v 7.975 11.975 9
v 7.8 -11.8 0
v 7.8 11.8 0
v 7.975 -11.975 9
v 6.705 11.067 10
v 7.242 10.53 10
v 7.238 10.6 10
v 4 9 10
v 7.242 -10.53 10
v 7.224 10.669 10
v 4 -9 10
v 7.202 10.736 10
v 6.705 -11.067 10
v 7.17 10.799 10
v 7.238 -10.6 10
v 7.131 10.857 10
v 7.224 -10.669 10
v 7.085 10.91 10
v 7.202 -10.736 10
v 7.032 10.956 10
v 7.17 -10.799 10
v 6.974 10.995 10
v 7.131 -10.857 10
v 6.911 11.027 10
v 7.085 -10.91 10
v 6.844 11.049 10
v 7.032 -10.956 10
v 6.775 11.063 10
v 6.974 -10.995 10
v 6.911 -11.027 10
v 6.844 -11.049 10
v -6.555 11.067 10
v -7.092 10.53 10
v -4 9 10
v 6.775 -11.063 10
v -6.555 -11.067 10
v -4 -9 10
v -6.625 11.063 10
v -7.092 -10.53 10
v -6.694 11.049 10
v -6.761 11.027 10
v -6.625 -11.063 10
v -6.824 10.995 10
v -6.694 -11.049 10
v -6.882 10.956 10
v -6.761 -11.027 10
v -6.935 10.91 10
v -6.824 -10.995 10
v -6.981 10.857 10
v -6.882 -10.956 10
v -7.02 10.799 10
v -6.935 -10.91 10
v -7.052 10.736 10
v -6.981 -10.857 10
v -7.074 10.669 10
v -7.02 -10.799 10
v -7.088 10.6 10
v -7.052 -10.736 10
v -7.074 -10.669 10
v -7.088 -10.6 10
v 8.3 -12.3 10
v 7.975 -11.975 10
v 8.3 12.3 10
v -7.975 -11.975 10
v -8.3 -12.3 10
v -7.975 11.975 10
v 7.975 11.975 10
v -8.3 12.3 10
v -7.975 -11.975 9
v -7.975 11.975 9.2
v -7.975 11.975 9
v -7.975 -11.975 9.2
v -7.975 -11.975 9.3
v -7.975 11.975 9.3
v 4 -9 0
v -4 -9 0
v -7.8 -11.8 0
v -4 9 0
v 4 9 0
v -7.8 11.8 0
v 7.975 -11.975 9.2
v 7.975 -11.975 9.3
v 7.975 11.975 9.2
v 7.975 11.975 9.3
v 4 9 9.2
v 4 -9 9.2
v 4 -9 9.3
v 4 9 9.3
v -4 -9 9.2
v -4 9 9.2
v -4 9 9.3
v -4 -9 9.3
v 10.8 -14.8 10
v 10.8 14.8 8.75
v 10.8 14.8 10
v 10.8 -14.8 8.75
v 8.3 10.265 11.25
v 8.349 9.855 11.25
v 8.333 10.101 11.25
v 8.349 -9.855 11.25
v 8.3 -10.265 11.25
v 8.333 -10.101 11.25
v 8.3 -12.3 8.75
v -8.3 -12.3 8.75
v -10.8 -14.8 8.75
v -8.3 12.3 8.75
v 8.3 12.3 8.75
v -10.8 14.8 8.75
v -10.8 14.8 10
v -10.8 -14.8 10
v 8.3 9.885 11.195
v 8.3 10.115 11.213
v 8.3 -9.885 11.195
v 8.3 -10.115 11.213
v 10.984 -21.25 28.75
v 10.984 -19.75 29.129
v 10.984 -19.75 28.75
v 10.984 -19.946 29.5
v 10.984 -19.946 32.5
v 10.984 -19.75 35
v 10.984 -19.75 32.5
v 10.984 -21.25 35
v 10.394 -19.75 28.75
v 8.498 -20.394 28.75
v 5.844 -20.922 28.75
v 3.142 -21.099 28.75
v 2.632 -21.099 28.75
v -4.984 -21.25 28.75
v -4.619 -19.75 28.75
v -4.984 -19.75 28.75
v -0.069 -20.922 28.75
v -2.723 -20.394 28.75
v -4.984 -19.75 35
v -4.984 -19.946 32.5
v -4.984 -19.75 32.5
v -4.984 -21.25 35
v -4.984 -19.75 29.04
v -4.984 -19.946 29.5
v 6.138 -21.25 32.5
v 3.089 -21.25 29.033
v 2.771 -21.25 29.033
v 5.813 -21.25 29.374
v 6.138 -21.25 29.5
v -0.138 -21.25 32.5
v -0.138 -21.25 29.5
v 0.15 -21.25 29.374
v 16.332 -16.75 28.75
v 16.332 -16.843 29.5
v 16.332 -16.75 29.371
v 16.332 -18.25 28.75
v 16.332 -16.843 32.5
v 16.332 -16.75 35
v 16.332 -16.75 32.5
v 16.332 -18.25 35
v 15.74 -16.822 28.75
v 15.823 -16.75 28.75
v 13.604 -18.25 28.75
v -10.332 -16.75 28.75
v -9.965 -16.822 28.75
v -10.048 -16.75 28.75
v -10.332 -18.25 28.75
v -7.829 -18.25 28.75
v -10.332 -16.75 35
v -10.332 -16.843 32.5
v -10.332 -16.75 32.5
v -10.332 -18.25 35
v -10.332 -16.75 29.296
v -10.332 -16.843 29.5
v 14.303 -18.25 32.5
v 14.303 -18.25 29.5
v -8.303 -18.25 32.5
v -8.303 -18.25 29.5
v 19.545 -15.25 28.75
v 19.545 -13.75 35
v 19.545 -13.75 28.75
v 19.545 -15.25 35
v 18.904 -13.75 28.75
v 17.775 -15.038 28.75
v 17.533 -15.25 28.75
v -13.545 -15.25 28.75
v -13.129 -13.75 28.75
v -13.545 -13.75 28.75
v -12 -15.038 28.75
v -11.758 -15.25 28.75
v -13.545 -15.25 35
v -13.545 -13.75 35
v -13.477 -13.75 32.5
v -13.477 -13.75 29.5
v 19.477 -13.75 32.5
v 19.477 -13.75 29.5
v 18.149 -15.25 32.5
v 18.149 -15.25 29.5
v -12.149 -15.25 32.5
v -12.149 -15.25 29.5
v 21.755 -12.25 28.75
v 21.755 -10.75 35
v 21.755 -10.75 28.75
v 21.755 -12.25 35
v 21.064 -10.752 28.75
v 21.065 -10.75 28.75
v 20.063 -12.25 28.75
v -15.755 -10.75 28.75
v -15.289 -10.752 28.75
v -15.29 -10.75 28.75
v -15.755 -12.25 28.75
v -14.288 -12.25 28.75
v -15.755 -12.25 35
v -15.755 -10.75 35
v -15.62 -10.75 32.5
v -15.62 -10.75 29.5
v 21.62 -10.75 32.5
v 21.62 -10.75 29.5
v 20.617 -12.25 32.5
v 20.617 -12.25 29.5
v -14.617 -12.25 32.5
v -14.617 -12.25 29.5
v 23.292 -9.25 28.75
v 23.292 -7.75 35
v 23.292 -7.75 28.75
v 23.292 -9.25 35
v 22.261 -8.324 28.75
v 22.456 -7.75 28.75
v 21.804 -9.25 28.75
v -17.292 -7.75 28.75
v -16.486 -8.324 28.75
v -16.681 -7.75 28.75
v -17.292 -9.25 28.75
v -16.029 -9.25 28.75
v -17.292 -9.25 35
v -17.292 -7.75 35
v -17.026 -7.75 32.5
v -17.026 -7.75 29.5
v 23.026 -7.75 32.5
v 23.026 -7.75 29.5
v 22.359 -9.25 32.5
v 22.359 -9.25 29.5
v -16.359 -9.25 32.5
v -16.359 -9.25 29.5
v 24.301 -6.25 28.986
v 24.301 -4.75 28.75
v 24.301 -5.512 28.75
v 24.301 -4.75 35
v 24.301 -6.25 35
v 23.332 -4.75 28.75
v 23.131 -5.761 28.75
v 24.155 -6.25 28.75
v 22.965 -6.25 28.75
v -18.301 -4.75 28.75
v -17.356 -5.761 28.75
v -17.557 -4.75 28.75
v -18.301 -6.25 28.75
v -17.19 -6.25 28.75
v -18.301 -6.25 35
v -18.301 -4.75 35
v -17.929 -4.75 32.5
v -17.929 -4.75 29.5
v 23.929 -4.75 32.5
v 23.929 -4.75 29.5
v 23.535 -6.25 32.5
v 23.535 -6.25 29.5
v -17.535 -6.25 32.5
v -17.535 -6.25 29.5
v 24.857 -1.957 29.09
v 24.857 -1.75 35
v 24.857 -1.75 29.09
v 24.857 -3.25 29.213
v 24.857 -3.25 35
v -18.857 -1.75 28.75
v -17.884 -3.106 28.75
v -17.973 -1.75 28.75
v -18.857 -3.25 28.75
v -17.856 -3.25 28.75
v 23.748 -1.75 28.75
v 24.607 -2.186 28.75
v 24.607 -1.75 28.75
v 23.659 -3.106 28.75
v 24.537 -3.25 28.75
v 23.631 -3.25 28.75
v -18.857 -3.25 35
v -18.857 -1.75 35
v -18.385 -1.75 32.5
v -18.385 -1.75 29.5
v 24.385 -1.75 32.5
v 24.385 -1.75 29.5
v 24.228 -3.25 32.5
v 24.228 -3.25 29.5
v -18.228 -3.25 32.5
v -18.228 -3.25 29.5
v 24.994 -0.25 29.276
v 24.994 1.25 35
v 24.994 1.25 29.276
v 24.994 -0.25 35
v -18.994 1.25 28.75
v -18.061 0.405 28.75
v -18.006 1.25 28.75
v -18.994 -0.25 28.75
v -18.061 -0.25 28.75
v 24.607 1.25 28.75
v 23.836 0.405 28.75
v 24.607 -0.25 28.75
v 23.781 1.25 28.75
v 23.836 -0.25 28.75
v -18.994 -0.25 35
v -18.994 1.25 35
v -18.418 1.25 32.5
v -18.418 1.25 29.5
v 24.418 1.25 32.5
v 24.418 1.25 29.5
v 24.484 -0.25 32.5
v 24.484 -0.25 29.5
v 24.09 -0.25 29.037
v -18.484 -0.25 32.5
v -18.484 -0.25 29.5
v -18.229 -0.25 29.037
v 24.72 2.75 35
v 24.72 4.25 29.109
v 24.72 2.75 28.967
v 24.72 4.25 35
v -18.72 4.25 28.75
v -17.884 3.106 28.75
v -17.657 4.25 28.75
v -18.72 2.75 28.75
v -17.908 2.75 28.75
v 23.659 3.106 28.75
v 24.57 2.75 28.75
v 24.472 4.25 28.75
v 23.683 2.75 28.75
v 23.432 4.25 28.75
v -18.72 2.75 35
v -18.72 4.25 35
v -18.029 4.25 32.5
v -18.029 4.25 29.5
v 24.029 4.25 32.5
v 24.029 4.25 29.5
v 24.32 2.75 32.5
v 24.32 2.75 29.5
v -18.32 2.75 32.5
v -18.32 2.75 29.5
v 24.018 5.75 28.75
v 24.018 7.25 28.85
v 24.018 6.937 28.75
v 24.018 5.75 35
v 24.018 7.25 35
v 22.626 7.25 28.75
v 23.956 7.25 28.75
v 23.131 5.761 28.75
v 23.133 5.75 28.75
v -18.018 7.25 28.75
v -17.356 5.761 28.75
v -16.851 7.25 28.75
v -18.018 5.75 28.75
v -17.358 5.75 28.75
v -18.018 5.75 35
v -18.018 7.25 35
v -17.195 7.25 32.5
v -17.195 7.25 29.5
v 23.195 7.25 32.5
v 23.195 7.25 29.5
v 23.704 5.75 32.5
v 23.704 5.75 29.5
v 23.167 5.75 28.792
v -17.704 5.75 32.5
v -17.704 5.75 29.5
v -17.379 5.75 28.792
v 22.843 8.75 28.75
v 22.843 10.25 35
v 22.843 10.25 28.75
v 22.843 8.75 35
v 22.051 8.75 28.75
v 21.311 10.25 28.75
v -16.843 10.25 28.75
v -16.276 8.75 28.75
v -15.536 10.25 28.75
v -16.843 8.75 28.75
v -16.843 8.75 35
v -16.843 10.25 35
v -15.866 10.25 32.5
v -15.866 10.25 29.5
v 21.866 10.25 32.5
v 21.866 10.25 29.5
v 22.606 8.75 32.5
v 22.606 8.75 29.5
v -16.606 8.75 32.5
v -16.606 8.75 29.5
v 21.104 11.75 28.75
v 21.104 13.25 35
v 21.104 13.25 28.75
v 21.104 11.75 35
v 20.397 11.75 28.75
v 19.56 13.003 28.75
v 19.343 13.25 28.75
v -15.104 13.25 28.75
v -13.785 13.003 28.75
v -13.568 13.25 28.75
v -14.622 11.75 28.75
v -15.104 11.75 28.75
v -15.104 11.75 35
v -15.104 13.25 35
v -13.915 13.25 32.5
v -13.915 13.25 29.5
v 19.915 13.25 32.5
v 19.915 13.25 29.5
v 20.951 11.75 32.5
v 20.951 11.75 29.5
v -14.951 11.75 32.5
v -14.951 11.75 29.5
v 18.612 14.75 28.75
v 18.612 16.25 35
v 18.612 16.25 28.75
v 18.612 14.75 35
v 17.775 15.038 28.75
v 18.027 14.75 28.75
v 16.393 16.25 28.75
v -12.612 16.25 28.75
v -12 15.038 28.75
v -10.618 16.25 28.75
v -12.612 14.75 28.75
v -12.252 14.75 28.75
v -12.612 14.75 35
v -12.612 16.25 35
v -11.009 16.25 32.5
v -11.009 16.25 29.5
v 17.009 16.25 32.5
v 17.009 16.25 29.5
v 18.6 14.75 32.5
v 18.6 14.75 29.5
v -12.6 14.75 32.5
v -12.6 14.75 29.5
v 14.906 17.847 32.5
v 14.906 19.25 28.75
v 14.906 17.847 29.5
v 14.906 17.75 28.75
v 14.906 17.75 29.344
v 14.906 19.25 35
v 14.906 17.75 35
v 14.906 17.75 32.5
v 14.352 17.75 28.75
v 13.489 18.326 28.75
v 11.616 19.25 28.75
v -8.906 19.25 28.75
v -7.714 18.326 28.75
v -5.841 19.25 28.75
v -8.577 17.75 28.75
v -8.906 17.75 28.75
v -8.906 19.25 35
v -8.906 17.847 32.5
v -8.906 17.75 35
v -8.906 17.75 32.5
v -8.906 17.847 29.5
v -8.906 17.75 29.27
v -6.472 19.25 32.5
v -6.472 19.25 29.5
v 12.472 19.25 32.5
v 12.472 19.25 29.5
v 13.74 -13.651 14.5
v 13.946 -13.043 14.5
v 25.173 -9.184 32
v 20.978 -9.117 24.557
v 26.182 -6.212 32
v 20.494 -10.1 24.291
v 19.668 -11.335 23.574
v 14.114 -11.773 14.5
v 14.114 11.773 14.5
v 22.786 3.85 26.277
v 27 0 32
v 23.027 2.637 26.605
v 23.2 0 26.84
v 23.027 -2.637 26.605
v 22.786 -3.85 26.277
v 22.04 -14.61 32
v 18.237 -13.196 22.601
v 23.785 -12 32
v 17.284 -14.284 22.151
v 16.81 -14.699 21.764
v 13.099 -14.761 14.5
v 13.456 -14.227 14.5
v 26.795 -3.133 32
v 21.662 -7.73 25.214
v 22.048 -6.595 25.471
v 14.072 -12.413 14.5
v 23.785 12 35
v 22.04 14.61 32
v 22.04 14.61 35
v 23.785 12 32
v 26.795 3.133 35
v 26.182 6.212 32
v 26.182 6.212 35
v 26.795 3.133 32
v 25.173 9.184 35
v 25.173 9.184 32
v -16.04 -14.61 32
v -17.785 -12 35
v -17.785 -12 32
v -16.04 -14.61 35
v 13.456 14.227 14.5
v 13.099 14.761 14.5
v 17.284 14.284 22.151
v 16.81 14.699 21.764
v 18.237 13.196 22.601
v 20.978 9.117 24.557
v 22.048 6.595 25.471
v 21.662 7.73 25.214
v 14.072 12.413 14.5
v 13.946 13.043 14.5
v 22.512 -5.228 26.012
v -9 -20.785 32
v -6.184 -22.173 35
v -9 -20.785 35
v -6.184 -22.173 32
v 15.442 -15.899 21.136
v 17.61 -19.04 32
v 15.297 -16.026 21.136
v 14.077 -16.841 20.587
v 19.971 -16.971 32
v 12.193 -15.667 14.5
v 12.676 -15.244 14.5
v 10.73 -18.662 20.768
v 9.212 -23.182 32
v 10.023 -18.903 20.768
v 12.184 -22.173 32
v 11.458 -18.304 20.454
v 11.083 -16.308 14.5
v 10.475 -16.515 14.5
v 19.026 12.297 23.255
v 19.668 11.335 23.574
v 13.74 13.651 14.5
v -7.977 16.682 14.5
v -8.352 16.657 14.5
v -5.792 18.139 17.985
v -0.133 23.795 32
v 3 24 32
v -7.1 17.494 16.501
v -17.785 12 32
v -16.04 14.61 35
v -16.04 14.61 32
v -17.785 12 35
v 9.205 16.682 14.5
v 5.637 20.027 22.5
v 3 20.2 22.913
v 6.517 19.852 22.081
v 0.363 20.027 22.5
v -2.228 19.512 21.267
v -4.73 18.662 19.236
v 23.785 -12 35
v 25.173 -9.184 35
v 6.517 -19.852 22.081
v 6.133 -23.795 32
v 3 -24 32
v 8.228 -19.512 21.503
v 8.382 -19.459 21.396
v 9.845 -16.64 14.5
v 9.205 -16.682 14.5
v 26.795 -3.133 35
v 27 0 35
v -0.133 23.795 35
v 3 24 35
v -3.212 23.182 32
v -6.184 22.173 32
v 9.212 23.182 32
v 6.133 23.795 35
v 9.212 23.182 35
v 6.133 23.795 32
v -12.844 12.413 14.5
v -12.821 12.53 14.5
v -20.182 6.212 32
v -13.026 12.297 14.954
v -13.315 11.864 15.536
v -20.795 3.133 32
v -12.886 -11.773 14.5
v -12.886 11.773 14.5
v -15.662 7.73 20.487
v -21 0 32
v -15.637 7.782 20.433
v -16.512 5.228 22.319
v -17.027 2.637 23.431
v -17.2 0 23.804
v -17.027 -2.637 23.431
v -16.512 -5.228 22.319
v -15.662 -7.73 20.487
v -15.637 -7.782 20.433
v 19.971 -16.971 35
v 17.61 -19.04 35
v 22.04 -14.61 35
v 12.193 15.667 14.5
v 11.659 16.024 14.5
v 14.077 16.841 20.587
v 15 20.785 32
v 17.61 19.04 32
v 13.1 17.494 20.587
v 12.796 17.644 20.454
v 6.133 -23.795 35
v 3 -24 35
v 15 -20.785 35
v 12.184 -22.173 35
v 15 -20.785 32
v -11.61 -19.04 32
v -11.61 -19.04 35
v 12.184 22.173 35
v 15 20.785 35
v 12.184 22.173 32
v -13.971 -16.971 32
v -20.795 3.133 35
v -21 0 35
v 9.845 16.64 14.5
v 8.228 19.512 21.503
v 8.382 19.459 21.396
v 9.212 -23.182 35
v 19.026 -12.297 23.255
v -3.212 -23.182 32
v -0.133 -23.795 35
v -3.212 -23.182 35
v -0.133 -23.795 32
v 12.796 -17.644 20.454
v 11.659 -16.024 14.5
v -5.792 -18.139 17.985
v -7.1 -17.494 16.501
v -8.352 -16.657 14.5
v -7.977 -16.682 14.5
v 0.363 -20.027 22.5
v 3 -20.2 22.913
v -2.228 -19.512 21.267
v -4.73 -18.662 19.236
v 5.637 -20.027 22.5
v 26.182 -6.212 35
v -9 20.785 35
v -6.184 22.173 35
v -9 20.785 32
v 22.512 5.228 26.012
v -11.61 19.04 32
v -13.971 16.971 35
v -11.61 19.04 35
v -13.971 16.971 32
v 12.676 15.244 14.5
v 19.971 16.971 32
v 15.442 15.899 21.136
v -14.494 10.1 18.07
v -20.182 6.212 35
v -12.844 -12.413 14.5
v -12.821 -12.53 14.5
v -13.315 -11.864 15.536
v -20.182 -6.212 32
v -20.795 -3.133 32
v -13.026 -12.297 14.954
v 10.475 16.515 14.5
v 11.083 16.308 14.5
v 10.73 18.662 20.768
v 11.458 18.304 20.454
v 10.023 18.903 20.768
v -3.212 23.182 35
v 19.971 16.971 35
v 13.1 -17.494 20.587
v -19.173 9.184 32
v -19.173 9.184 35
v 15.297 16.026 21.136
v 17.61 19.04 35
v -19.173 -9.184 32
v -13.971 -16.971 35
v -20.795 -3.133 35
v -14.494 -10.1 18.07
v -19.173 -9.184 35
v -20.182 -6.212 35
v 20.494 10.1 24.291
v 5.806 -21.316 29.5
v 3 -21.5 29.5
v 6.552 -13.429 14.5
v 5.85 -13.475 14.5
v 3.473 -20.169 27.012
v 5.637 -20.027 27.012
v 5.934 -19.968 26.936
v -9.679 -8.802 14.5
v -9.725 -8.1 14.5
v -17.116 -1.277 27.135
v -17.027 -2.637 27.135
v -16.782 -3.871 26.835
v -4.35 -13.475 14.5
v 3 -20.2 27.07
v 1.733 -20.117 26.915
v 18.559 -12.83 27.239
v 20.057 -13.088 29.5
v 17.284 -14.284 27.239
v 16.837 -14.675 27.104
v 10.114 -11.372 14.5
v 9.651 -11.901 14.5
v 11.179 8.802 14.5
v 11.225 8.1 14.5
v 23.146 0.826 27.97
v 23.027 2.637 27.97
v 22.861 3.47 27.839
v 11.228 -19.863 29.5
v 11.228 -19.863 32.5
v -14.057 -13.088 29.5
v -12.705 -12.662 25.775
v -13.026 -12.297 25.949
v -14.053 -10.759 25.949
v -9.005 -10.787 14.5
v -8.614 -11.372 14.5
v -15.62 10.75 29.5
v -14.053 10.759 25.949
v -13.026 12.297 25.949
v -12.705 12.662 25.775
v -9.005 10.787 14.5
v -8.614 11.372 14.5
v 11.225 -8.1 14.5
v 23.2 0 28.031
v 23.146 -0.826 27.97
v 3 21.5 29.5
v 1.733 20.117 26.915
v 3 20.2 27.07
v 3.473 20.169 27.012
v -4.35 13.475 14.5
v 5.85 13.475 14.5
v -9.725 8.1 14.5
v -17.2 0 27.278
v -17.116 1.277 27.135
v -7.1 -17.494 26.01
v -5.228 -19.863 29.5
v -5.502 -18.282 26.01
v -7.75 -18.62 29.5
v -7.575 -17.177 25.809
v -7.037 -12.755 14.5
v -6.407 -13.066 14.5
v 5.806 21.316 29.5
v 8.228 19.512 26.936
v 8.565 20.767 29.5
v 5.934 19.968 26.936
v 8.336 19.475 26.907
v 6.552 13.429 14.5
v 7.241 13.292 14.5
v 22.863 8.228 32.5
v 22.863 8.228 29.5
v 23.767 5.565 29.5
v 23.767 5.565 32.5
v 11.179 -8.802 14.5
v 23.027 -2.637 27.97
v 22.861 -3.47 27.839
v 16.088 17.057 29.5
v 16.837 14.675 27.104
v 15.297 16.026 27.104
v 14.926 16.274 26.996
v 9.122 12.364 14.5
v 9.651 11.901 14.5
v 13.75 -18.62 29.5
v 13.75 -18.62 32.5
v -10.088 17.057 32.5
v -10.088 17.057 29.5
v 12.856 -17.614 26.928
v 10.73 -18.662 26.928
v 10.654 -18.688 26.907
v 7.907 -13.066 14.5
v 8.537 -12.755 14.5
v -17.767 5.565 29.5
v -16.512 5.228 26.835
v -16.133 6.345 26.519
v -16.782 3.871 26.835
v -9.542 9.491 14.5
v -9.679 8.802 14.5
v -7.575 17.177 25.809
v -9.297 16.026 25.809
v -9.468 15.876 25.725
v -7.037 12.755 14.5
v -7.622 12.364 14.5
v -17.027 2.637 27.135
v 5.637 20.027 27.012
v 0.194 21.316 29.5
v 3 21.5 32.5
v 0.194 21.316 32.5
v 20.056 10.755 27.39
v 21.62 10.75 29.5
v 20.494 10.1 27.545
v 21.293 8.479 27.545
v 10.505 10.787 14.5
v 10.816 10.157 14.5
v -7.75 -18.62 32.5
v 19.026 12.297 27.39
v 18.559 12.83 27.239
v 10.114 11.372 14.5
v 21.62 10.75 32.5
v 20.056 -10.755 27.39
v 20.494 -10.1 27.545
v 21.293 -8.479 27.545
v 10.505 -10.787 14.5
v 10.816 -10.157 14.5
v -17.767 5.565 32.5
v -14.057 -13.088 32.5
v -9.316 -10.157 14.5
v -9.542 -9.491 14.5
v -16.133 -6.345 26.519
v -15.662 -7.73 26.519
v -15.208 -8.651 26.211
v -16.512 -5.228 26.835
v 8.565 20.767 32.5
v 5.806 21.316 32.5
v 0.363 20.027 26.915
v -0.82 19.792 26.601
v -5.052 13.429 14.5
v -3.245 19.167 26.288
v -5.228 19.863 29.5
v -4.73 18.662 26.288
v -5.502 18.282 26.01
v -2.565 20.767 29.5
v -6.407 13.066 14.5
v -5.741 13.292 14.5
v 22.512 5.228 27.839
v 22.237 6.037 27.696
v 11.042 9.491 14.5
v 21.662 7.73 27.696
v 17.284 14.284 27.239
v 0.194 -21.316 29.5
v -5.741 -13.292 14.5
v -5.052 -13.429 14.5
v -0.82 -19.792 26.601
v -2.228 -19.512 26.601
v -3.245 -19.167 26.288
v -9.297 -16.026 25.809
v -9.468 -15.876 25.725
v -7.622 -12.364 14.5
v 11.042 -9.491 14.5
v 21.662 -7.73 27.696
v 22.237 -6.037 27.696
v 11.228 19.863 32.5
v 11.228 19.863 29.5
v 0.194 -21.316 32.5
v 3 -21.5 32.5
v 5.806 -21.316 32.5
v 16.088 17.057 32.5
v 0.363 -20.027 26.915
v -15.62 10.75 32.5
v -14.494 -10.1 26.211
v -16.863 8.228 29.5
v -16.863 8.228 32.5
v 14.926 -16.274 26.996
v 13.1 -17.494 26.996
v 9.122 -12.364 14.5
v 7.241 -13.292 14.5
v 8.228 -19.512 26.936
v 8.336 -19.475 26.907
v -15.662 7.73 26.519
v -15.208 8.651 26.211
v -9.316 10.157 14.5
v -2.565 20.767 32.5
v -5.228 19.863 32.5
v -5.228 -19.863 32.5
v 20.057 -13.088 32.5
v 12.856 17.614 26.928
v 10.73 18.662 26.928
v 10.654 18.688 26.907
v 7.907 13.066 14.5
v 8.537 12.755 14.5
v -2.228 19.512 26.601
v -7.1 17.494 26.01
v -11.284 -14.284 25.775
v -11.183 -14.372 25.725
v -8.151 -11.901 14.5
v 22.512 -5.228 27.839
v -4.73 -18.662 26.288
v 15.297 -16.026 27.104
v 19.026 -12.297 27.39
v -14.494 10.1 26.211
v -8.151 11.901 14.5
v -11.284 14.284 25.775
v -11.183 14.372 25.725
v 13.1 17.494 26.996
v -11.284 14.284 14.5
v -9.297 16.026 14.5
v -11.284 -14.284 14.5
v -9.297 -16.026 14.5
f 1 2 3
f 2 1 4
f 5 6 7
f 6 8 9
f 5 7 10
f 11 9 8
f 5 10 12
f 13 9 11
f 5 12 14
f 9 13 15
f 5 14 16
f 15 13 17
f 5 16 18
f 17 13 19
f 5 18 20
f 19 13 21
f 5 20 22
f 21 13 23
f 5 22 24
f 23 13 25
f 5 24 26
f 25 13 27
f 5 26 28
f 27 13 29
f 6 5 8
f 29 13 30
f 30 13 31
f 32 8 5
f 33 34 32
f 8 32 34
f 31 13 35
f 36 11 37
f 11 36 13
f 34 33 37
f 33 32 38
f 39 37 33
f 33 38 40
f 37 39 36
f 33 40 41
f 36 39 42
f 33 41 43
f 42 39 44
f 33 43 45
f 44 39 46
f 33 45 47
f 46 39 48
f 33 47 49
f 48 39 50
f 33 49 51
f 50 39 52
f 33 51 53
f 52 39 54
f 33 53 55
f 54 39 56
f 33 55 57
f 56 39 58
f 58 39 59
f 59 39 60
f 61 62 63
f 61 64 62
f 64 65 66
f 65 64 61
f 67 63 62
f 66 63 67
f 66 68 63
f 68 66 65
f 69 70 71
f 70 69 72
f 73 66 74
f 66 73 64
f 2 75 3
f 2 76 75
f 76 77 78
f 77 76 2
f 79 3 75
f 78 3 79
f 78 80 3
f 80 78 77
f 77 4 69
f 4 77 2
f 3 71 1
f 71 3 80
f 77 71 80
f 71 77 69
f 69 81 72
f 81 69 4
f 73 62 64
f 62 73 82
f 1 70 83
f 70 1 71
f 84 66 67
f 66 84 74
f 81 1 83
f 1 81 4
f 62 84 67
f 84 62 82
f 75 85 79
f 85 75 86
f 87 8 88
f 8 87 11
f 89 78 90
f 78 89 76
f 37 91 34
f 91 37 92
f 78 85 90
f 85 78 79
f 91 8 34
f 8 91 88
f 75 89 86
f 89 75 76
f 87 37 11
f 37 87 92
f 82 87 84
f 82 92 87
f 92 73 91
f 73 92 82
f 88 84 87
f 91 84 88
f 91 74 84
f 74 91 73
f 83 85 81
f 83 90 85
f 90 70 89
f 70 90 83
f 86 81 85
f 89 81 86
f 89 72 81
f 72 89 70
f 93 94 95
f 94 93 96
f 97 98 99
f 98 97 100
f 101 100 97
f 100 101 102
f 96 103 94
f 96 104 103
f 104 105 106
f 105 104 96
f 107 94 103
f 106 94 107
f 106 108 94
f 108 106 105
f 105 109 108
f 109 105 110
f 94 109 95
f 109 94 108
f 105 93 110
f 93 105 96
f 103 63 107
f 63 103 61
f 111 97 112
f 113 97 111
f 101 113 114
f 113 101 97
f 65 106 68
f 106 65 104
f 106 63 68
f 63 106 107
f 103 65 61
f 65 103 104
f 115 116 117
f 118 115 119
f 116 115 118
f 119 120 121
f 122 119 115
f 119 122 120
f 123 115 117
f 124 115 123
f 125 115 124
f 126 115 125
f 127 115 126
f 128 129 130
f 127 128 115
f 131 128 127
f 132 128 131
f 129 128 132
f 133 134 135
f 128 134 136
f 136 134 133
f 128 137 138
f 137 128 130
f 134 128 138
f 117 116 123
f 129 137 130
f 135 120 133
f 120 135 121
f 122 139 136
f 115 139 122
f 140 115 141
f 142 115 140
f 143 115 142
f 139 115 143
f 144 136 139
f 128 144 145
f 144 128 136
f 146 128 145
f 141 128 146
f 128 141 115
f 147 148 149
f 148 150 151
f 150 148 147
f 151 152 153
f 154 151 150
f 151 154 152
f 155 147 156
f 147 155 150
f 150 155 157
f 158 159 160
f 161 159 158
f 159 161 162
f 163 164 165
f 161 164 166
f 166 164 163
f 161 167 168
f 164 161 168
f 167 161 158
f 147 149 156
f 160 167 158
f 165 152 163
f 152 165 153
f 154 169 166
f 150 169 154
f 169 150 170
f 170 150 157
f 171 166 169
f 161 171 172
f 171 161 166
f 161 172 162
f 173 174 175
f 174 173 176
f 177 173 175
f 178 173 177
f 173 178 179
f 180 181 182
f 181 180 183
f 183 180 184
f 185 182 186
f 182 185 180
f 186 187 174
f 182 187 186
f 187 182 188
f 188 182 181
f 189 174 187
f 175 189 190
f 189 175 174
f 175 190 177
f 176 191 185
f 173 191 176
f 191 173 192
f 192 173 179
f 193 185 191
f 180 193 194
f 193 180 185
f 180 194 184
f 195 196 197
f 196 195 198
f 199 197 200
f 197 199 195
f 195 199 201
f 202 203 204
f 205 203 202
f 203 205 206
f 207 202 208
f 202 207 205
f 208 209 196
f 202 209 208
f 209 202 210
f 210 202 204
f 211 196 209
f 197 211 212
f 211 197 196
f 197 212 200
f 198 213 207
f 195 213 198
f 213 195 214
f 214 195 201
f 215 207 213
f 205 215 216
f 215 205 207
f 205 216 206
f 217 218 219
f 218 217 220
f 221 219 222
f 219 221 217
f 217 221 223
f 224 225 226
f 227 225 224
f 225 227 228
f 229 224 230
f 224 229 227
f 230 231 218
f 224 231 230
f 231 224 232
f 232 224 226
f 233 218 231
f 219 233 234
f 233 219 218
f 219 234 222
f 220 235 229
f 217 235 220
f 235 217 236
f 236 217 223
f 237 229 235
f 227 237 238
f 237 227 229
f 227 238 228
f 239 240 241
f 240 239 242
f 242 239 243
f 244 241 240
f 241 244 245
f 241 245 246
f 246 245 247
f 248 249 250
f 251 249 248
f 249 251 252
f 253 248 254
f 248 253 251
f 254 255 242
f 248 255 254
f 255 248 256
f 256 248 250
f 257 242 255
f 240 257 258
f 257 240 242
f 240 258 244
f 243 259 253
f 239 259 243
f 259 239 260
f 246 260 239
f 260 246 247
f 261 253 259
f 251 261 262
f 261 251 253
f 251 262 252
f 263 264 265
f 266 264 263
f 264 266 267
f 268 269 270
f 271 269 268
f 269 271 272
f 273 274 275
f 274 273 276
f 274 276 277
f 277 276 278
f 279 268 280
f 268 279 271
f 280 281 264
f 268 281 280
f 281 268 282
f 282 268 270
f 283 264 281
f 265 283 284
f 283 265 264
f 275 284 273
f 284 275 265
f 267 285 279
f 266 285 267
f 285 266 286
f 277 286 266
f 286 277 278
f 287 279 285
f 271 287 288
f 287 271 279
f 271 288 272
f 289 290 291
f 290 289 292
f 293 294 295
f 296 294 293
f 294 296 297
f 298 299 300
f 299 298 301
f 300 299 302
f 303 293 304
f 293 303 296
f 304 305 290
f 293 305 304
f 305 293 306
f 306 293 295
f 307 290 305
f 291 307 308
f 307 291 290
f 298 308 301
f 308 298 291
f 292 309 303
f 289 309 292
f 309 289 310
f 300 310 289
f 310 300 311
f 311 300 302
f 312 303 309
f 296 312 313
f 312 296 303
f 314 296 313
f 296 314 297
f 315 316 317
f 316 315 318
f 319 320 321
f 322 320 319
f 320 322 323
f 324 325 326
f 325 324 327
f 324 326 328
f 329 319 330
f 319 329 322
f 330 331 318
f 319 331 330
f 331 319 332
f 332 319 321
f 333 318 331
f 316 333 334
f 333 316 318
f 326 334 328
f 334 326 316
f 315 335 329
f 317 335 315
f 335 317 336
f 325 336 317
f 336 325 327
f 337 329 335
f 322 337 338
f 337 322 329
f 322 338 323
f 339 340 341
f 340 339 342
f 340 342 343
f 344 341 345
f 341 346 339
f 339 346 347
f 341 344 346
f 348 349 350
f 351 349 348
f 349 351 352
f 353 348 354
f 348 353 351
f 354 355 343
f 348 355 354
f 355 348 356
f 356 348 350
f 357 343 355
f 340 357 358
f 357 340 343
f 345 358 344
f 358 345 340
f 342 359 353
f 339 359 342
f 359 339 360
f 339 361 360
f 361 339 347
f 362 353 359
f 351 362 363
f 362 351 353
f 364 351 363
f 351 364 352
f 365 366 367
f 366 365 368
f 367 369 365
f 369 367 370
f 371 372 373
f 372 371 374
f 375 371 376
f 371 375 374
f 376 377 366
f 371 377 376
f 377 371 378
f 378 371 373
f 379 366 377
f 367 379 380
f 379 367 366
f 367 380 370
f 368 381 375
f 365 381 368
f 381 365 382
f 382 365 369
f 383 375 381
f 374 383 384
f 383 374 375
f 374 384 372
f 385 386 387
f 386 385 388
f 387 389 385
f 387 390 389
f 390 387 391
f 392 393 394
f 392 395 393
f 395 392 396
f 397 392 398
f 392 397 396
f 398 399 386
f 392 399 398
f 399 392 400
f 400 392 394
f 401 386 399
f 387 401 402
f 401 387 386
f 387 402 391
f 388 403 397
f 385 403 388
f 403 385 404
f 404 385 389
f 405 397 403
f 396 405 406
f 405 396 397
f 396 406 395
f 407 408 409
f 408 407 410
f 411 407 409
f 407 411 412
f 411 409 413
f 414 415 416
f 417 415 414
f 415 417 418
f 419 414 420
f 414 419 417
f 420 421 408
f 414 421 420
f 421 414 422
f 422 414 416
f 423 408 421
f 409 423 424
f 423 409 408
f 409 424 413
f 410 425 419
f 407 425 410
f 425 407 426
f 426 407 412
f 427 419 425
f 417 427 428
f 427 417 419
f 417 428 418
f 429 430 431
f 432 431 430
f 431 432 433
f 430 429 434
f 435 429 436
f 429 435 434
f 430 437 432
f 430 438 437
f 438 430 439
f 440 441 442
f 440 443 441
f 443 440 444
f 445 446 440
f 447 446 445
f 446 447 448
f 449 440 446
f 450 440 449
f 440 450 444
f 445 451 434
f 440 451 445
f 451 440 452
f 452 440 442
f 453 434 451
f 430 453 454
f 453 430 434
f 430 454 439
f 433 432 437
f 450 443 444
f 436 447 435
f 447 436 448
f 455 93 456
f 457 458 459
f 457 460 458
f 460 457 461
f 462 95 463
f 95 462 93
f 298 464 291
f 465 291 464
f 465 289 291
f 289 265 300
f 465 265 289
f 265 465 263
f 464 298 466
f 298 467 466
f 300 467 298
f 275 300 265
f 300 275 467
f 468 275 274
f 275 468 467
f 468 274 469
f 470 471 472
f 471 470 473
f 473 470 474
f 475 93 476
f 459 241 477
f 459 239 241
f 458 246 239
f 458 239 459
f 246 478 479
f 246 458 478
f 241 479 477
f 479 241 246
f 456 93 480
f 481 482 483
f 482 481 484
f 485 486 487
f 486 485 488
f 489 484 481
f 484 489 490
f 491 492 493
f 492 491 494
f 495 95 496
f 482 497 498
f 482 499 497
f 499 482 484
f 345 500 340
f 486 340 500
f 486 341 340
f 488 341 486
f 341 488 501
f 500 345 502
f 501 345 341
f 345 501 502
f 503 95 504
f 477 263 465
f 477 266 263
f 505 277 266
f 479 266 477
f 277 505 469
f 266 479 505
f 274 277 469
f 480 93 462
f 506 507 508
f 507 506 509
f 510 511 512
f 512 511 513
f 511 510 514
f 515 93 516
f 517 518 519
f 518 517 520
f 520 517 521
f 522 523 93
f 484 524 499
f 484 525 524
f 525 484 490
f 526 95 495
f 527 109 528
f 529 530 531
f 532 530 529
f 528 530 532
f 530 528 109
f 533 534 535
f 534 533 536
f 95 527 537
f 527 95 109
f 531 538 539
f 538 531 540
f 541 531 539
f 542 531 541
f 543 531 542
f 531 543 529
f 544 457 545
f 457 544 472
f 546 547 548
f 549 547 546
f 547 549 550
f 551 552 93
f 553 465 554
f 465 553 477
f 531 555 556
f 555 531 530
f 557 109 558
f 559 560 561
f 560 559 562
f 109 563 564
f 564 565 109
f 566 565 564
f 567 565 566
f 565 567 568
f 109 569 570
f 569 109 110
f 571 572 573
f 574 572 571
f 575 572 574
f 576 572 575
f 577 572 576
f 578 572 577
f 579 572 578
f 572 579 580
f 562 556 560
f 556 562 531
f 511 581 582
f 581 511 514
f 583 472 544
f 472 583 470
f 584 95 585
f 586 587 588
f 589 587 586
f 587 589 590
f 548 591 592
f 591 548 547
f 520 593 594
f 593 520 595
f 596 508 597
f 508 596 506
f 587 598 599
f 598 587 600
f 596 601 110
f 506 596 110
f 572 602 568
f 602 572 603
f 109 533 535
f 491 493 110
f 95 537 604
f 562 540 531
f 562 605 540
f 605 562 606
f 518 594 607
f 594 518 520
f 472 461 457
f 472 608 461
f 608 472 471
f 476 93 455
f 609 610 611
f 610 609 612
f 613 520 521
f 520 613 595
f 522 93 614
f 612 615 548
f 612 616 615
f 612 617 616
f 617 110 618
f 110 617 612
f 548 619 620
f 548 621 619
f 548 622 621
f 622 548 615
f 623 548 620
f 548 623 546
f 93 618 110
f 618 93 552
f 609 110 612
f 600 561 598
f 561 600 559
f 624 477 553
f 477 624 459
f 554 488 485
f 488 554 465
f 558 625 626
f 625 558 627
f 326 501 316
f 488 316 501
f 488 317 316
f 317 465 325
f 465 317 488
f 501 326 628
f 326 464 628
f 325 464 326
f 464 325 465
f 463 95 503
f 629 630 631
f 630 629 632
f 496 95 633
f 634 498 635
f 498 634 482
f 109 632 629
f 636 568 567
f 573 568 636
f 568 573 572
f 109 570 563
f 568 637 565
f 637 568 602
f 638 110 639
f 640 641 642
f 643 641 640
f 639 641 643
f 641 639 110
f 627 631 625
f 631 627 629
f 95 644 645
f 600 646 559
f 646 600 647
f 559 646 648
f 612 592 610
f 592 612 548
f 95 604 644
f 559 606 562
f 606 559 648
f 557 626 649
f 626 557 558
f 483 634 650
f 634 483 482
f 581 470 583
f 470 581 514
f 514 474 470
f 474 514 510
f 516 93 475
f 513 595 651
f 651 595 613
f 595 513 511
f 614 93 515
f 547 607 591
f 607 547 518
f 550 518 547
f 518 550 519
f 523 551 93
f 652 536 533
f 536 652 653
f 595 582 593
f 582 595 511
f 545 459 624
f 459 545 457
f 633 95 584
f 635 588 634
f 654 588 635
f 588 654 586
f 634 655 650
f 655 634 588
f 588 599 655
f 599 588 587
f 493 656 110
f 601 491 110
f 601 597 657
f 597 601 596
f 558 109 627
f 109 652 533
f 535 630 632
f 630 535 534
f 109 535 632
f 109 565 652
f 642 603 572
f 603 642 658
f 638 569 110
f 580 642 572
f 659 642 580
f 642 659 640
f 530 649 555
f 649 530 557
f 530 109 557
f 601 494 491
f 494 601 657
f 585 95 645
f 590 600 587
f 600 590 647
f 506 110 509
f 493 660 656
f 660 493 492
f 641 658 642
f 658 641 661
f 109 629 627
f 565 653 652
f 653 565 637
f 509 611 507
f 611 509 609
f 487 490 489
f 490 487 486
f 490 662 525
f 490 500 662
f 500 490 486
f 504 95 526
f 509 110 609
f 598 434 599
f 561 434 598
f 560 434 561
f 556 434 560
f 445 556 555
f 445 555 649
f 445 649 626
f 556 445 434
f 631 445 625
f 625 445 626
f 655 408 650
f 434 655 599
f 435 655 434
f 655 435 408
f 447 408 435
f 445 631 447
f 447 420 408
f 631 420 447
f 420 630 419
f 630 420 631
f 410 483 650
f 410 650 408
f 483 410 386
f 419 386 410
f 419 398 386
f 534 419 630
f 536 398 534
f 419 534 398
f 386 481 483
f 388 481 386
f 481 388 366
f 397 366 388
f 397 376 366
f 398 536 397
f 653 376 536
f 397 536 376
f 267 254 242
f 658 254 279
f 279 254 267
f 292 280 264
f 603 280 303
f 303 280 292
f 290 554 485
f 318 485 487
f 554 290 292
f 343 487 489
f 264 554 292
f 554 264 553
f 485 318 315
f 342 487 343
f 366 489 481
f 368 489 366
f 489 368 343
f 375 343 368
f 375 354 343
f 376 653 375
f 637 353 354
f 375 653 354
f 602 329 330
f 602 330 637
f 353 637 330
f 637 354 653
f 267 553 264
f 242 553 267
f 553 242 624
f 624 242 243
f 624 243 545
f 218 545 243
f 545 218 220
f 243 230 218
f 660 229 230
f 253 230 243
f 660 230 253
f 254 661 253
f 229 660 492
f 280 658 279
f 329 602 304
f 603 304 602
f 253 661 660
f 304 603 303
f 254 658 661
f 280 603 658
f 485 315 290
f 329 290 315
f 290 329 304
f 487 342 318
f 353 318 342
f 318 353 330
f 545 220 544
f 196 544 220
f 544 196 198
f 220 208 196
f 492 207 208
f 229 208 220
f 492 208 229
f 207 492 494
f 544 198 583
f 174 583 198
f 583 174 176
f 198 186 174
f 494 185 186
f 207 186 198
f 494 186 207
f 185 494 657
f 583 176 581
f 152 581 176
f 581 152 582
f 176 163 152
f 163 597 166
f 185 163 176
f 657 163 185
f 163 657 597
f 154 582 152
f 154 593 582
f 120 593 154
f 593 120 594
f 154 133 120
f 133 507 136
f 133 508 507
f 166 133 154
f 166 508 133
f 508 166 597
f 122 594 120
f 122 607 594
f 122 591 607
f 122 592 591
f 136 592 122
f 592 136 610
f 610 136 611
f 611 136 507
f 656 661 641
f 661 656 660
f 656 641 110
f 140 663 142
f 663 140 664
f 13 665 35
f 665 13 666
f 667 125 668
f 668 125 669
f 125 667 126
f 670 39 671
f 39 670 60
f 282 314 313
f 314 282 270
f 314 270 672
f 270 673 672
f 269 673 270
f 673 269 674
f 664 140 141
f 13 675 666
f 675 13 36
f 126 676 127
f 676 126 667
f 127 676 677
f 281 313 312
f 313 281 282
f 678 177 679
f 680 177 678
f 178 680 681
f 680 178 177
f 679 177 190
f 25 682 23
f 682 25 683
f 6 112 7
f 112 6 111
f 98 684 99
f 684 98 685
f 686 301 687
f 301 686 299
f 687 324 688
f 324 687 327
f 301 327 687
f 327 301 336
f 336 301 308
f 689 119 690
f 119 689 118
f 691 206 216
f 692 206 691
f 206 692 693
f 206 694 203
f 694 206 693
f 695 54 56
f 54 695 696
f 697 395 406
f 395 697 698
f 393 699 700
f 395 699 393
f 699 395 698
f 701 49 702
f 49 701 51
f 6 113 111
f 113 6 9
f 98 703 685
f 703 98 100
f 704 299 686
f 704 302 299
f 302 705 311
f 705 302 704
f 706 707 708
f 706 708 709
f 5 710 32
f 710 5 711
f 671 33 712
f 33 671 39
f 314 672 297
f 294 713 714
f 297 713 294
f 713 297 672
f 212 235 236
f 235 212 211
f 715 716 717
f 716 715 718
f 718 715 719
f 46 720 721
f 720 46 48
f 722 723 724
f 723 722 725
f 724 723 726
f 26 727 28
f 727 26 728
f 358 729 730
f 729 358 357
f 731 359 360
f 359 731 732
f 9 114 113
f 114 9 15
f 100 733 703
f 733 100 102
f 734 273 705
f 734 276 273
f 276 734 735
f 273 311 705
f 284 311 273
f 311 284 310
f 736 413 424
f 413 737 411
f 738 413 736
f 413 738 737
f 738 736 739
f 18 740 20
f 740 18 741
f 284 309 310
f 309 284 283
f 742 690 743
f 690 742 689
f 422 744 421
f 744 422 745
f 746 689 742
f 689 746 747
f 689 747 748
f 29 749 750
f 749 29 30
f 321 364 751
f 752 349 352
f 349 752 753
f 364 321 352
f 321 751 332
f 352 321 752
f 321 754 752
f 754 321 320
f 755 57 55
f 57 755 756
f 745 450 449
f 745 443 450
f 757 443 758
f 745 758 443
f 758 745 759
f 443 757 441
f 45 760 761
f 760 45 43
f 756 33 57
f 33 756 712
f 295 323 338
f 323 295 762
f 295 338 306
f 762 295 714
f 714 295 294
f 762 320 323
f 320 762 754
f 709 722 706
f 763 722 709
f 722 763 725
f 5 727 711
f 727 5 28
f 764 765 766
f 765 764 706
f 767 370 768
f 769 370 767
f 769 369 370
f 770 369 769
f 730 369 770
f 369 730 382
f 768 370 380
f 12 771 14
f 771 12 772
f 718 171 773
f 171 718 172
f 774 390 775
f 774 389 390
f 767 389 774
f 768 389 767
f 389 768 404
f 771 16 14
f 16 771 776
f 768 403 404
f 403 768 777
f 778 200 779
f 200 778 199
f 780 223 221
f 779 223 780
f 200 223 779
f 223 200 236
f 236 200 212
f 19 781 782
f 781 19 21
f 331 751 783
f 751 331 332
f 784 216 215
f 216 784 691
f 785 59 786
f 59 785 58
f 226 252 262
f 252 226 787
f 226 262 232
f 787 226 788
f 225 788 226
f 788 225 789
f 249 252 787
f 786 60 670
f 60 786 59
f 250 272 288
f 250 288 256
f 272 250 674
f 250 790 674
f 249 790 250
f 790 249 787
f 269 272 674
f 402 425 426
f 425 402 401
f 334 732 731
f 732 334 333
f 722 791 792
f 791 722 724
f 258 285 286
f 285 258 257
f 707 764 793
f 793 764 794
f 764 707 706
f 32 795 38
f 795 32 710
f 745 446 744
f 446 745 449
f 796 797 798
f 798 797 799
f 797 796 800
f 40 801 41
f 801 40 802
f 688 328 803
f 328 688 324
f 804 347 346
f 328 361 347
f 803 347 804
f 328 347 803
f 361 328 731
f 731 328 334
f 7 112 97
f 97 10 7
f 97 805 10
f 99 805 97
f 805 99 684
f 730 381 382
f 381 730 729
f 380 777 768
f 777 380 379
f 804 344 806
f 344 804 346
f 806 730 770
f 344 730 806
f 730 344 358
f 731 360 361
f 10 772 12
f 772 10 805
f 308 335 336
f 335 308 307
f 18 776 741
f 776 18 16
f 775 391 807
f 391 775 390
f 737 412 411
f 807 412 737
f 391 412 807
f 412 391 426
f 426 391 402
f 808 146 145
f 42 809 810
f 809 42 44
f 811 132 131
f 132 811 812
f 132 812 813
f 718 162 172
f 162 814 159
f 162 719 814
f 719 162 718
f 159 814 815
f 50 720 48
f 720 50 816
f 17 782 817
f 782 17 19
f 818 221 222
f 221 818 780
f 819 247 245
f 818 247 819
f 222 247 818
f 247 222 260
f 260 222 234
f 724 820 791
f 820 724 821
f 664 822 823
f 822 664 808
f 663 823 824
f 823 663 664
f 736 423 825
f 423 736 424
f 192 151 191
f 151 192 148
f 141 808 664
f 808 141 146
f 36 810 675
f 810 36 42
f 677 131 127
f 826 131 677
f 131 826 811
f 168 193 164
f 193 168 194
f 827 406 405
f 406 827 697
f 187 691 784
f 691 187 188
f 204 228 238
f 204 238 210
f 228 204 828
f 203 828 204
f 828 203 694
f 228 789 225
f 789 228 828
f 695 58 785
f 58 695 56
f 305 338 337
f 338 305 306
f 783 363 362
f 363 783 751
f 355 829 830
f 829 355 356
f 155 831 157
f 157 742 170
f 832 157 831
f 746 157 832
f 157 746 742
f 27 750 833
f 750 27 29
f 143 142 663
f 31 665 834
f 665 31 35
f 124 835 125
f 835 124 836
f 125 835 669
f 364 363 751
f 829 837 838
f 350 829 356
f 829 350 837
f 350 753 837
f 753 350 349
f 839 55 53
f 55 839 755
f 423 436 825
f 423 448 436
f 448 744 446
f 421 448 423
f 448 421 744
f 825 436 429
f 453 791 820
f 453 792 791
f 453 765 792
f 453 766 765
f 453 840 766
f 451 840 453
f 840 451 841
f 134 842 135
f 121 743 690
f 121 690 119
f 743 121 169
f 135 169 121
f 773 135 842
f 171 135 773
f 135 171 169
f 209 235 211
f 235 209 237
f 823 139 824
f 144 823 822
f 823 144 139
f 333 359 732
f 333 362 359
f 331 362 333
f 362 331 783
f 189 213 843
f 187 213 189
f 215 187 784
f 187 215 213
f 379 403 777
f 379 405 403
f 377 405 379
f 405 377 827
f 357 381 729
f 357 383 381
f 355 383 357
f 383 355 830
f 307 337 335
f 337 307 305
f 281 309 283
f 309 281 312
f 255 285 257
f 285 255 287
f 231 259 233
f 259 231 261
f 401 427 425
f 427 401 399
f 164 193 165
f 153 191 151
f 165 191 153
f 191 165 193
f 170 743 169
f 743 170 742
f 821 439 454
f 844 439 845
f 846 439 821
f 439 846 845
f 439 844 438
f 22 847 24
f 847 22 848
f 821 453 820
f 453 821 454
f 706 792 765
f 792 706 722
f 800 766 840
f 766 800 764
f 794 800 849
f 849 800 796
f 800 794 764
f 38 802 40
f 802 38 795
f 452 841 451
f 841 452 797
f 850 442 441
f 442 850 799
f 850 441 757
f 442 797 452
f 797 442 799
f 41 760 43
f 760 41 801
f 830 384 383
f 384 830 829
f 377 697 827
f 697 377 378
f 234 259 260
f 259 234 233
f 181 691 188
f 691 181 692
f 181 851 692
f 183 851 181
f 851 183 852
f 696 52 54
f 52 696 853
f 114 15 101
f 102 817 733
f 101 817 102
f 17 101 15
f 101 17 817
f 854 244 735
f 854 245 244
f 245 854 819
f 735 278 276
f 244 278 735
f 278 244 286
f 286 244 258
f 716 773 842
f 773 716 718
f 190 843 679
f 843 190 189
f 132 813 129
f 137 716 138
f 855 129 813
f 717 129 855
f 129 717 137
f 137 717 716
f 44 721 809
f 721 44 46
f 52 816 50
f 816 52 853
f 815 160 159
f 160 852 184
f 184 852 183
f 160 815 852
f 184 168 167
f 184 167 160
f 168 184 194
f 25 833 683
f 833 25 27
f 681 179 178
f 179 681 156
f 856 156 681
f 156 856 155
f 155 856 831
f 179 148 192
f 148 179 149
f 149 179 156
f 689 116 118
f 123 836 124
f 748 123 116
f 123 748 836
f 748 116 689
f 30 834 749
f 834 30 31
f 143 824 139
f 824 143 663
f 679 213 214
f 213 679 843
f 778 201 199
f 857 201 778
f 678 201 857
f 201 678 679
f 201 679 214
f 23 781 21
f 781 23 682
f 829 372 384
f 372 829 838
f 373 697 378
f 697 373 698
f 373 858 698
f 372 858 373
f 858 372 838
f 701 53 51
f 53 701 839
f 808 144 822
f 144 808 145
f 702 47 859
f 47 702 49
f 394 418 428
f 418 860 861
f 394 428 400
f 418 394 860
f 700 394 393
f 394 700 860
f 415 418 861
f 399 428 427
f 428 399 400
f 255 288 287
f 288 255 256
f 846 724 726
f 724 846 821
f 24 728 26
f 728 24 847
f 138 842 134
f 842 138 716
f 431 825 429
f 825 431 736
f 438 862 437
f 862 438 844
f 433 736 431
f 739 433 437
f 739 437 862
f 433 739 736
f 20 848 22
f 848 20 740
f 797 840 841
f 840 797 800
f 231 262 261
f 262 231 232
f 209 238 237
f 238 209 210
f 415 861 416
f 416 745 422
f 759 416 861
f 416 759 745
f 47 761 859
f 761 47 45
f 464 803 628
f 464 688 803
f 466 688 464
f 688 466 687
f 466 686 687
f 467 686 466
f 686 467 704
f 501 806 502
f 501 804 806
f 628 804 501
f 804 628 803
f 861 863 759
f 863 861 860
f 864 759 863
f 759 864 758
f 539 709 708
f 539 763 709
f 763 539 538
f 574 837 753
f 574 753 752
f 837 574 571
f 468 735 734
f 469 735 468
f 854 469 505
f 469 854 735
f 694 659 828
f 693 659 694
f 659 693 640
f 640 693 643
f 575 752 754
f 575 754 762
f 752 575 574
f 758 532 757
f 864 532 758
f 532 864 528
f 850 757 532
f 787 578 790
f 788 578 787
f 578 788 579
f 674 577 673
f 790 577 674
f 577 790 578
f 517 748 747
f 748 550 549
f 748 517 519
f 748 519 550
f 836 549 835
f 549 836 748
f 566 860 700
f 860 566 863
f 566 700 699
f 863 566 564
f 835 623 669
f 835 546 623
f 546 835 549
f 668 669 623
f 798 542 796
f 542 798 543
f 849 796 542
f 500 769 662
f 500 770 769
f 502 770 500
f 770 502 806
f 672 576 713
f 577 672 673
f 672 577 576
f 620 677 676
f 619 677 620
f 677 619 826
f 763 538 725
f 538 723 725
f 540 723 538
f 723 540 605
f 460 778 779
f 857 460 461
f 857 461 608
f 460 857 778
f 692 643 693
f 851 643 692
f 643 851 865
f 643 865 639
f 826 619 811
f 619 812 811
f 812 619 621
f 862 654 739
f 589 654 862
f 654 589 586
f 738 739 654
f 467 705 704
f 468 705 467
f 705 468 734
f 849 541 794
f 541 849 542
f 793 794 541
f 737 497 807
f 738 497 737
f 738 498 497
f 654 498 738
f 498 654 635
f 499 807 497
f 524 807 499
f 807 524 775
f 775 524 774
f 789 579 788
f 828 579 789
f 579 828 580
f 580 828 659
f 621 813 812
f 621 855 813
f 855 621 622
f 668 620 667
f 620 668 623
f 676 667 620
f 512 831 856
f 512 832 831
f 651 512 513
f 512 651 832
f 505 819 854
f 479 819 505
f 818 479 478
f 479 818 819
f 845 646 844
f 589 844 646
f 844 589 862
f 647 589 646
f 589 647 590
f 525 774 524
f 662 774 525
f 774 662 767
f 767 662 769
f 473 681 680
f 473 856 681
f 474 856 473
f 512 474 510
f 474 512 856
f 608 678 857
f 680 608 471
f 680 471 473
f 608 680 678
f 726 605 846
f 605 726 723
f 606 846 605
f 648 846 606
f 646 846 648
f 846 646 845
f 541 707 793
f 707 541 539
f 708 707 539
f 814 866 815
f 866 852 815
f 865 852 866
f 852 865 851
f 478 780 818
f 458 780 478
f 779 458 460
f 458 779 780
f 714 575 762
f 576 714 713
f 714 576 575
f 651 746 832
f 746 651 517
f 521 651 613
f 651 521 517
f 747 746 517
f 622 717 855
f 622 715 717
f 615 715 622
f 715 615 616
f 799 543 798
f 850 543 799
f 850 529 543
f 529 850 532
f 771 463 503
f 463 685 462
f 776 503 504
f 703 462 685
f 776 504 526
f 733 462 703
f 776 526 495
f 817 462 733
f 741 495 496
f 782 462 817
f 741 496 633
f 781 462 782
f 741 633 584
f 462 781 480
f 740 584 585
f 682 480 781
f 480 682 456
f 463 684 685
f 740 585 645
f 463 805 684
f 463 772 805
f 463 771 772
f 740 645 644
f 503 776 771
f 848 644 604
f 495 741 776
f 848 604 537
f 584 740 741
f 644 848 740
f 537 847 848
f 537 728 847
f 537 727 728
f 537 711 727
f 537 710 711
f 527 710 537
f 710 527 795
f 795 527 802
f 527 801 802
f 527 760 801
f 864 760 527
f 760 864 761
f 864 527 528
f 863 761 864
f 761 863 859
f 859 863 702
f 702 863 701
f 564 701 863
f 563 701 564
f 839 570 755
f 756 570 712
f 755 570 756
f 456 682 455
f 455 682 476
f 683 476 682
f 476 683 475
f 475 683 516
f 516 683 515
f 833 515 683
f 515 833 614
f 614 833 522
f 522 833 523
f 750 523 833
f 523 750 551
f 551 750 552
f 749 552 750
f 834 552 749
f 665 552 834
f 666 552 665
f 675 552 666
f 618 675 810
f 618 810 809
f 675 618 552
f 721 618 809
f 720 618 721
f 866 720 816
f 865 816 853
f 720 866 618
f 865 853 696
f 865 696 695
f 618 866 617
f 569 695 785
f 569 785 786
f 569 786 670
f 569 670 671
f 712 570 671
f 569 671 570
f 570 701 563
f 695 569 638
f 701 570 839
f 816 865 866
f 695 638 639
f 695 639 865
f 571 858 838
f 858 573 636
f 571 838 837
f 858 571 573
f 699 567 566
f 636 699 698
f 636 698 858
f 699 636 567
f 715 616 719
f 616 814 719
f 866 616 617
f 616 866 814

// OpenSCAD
// file: sleds.scad
// ==========================================
// Xentient Framework - Universal Sled & Socket Library
// Shared modules for all peripheral caps
// ==========================================
// Per Framework §2: Universal Mating Protocol
// Female Socket (in hub): 24.0×16.0×10.0mm, wire channel 18×8mm
// Male Sled (on cap base): 23.6×15.6×10.0mm, 1° draft, hollow 18×8mm
// Units: mm

$fn = 64;

// ==========================================
// MALE SLED PARAMETERS
// ==========================================

Sled_W       = 23.6;    // Width (0.4mm tolerance in female 24.0mm)
Sled_H       = 15.6;    // Height (0.4mm tolerance in female 16.0mm)
Sled_D       = 10.0;    // Depth (insertion length)
Sled_Draft   = 1.0;     // 1-degree draft angle
Sled_Wire_W  = 18.0;    // Wire pass-through width
Sled_Wire_H  = 8.0;     // Wire pass-through height
Sled_Wall    = 2.0;     // Minimum wall thickness

// Derived
Sled_Draft_Off = Sled_D * tan(Sled_Draft);  // ~0.17mm per side

// ==========================================
// MODULE: male_sled()
// The plug base that inserts into the hub's female socket.
// All caps start with this at their base.
//
// Usage: difference() { male_sled(); /* your cap-specific cutouts */ }
// ==========================================

module male_sled() {
    difference() {
        // Outer body with 1° draft
        hull() {
            // Entry face (slightly larger for wedge fit)
            translate([0, 0, Sled_D - 0.5])
                cube([Sled_H + 2*Sled_Draft_Off,
                      Sled_W + 2*Sled_Draft_Off,
                      1], center=true);
            // Inner face (exact size)
            translate([0, 0, 0.5])
                cube([Sled_H, Sled_W, 1], center=true);
        }

        // Wire pass-through (hollow core)
        translate([0, 0, Sled_D / 2])
            cube([Sled_Wire_H, Sled_Wire_W, Sled_D + 2], center=true);

        // Entry chamfer (45° for easy insertion)
        chamfer_h = 1.5;
        translate([0, 0, Sled_D - chamfer_h/2])
            hull() {
                cube([Sled_H + 2*chamfer_h, Sled_W + 2*chamfer_h, 0.1], center=true);
                cube([Sled_H, Sled_W, 0.1], center=true);
            }
    }
}

// ==========================================
// MODULE: male_sled_with_flange()
// Adds a flange around the sled base for cap-to-hub transition.
// Flange sits flush against hub exterior face.
//
// flange_w: extra width beyond sled on each side
// flange_h: extra height beyond sled on each side
// flange_t: flange thickness
// ==========================================

module male_sled_with_flange(flange_w=2.0, flange_h=2.0, flange_t=2.0) {
    union() {
        male_sled();

        // Flange ring around sled entry
        translate([0, 0, Sled_D])
            difference() {
                cube([Sled_H + 2*flange_h,
                      Sled_W + 2*flange_w,
                      flange_t], center=true);
                // Cut sled opening through flange
                cube([Sled_H + 1, Sled_W + 1, flange_t + 2], center=true);
            }
    }
}

// ==========================================
// MODULE: wire_channel()
// Internal wire routing channel from sled to component.
// Extends from sled core outward through the cap body.
//
// length: distance from sled to component
// direction: "straight" or "angled"
// ==========================================

module wire_channel(length=15, direction="straight") {
    if (direction == "straight") {
        translate([0, 0, Sled_D / 2 + length / 2])
            cube([Sled_Wire_H, Sled_Wire_W, length + 1], center=true);
    }
}

// ==========================================
// VISUALIZATION HELPERS
// ==========================================

// Render just the sled for testing
// male_sled();
// main file
// ==========================================
// Xentient Framework - Housing 2: Speak (MAX98357A + 3W 8Ω Speaker)
// Trapezoidal flare housing with thermal divider
// ==========================================
// Component: MAX98357A amp (7×7mm) + 3W 8Ω speaker (40mm dia)
// Connection: 6-pin JST XH pigtail (I2S: VCC, GND, DIN, BCLK, LRC, GAIN)
// Socket: 90° face (near USB-C, ventilation)
// Per Framework §4 Housing 2
// IMPORTANT: Speaker (40mm) > Sled (24mm), housing MUST flare outward
// Units: mm

include <sleds.scad>;

$fn = 64;

// ==========================================
// COMPONENT DIMENSIONS
// ==========================================

Spk_Dia     = 40.0;    // Speaker diameter
Spk_Depth   = 15.0;    // Speaker magnet depth
Spk_Grille  = 1.5;     // Grille bar thickness
Amp_PCB_W   = 7.0;     // MAX98357A board width
Amp_PCB_H   = 7.0;     // MAX98357A board height
Amp_PCB_T   = 1.6;     // PCB thickness

// Housing dimensions
Flare_W     = 48.0;     // Max width at speaker end (40mm speaker + walls)
Flare_H     = 46.0;     // Max height at speaker end
Flare_Depth = 22.0;     // Depth from sled face to speaker front
House_Wall  = 2.5;      // Thicker walls for speaker vibration
Div_Wall_T  = 2.0;      // Thermal divider thickness

// Asymmetric offset — speaker extends more to one side
// to avoid blocking neighboring caps
Offset_X    = 3.0;      // Shift speaker center away from sled center

// ==========================================
// MODULE: housing_speak()
// ==========================================

module housing_speak() {
    union() {
        // Sled base with wider flange for trapezoidal transition
        male_sled_with_flange(flange_w=3.0, flange_h=3.0, flange_t=2.5);

        // Trapezoidal flare body
        translate([0, 0, Sled_D]) {
            difference() {
                // Outer shell: sled face → speaker flare
                hull() {
                    // Sled transition face
                    translate([0, 0, 1])
                        cube([Sled_H + 6, Sled_W + 6, 2], center=true);
                    // Speaker end face (asymmetric offset)
                    translate([Offset_X, 0, Flare_Depth])
                        cylinder(h=3, d1=Flare_W, d2=Flare_W, $fn=48);
                }

                // Inner cavity: sled channel → speaker chamber
                hull() {
                    translate([0, 0, 0.5])
                        cube([Sled_H - 2, Sled_W - 2, 2], center=true);
                    translate([Offset_X, 0, Flare_Depth - House_Wall])
                        cylinder(h=3, d=Flare_W - 2*House_Wall, $fn=48);
                }

                // Speaker grille (front face, offset)
                translate([Offset_X, 0, Flare_Depth])
                    grille_pattern(dia=Flare_W - 4, bar_w=Spk_Grille);

                // Speaker cutout (40mm diameter, 2mm inset from front)
                translate([Offset_X, 0, Flare_Depth - Spk_Depth - House_Wall])
                    cylinder(h=Spk_Depth + 1, d=Spk_Dia + 0.4, $fn=48);

                // Thermal divider between amp and speaker magnet
                // Vertical wall separating amp zone (bottom) from speaker zone
                translate([0, 0, Flare_Depth * 0.4])
                    cube([Flare_W + 10, Div_Wall_T, Flare_Depth * 0.3], center=true);

                // MAX98357A mount shelf (behind divider, near sled)
                translate([0, 0, Sled_D * 0.3])
                    cube([Amp_PCB_W + 0.8, Amp_PCB_H + 0.8, 2], center=true);

                // Wire channel
                translate([0, 0, -2])
                    cube([Sled_Wire_H, Sled_Wire_W, Flare_Depth + 6], center=true);

                // Ventilation slits (top and bottom for amp heat dissipation)
                for (vz = [Flare_Depth * 0.2, Flare_Depth * 0.35]) {
                    // Top vent
                    translate([Offset_X, Flare_W/2 - 1, vz])
                        cube([8, House_Wall + 2, 3], center=true);
                    // Bottom vent
                    translate([Offset_X, -Flare_W/2 + 1, vz])
                        cube([8, House_Wall + 2, 3], center=true);
                }
            }
        }
    }
}

// ==========================================
// MODULE: grille_pattern()
// Creates a speaker grille with horizontal bars
// ==========================================

module grille_pattern(dia=36, bar_w=1.5, bar_spc=3.0) {
    n_bars = floor(dia / bar_spc);
    for (i = [0 : n_bars - 1]) {
        y_off = -dia/2 + i * bar_spc + bar_spc/2;
        chord_half = sqrt(max(0, (dia/2)*(dia/2) - y_off*y_off));
        if (chord_half > bar_w) {
            translate([0, y_off, 0])
                cube([2 * chord_half, bar_w, House_Wall + 4], center=true);
        }
    }
}

// ==========================================
// RENDER
// ==========================================

housing_speak();
